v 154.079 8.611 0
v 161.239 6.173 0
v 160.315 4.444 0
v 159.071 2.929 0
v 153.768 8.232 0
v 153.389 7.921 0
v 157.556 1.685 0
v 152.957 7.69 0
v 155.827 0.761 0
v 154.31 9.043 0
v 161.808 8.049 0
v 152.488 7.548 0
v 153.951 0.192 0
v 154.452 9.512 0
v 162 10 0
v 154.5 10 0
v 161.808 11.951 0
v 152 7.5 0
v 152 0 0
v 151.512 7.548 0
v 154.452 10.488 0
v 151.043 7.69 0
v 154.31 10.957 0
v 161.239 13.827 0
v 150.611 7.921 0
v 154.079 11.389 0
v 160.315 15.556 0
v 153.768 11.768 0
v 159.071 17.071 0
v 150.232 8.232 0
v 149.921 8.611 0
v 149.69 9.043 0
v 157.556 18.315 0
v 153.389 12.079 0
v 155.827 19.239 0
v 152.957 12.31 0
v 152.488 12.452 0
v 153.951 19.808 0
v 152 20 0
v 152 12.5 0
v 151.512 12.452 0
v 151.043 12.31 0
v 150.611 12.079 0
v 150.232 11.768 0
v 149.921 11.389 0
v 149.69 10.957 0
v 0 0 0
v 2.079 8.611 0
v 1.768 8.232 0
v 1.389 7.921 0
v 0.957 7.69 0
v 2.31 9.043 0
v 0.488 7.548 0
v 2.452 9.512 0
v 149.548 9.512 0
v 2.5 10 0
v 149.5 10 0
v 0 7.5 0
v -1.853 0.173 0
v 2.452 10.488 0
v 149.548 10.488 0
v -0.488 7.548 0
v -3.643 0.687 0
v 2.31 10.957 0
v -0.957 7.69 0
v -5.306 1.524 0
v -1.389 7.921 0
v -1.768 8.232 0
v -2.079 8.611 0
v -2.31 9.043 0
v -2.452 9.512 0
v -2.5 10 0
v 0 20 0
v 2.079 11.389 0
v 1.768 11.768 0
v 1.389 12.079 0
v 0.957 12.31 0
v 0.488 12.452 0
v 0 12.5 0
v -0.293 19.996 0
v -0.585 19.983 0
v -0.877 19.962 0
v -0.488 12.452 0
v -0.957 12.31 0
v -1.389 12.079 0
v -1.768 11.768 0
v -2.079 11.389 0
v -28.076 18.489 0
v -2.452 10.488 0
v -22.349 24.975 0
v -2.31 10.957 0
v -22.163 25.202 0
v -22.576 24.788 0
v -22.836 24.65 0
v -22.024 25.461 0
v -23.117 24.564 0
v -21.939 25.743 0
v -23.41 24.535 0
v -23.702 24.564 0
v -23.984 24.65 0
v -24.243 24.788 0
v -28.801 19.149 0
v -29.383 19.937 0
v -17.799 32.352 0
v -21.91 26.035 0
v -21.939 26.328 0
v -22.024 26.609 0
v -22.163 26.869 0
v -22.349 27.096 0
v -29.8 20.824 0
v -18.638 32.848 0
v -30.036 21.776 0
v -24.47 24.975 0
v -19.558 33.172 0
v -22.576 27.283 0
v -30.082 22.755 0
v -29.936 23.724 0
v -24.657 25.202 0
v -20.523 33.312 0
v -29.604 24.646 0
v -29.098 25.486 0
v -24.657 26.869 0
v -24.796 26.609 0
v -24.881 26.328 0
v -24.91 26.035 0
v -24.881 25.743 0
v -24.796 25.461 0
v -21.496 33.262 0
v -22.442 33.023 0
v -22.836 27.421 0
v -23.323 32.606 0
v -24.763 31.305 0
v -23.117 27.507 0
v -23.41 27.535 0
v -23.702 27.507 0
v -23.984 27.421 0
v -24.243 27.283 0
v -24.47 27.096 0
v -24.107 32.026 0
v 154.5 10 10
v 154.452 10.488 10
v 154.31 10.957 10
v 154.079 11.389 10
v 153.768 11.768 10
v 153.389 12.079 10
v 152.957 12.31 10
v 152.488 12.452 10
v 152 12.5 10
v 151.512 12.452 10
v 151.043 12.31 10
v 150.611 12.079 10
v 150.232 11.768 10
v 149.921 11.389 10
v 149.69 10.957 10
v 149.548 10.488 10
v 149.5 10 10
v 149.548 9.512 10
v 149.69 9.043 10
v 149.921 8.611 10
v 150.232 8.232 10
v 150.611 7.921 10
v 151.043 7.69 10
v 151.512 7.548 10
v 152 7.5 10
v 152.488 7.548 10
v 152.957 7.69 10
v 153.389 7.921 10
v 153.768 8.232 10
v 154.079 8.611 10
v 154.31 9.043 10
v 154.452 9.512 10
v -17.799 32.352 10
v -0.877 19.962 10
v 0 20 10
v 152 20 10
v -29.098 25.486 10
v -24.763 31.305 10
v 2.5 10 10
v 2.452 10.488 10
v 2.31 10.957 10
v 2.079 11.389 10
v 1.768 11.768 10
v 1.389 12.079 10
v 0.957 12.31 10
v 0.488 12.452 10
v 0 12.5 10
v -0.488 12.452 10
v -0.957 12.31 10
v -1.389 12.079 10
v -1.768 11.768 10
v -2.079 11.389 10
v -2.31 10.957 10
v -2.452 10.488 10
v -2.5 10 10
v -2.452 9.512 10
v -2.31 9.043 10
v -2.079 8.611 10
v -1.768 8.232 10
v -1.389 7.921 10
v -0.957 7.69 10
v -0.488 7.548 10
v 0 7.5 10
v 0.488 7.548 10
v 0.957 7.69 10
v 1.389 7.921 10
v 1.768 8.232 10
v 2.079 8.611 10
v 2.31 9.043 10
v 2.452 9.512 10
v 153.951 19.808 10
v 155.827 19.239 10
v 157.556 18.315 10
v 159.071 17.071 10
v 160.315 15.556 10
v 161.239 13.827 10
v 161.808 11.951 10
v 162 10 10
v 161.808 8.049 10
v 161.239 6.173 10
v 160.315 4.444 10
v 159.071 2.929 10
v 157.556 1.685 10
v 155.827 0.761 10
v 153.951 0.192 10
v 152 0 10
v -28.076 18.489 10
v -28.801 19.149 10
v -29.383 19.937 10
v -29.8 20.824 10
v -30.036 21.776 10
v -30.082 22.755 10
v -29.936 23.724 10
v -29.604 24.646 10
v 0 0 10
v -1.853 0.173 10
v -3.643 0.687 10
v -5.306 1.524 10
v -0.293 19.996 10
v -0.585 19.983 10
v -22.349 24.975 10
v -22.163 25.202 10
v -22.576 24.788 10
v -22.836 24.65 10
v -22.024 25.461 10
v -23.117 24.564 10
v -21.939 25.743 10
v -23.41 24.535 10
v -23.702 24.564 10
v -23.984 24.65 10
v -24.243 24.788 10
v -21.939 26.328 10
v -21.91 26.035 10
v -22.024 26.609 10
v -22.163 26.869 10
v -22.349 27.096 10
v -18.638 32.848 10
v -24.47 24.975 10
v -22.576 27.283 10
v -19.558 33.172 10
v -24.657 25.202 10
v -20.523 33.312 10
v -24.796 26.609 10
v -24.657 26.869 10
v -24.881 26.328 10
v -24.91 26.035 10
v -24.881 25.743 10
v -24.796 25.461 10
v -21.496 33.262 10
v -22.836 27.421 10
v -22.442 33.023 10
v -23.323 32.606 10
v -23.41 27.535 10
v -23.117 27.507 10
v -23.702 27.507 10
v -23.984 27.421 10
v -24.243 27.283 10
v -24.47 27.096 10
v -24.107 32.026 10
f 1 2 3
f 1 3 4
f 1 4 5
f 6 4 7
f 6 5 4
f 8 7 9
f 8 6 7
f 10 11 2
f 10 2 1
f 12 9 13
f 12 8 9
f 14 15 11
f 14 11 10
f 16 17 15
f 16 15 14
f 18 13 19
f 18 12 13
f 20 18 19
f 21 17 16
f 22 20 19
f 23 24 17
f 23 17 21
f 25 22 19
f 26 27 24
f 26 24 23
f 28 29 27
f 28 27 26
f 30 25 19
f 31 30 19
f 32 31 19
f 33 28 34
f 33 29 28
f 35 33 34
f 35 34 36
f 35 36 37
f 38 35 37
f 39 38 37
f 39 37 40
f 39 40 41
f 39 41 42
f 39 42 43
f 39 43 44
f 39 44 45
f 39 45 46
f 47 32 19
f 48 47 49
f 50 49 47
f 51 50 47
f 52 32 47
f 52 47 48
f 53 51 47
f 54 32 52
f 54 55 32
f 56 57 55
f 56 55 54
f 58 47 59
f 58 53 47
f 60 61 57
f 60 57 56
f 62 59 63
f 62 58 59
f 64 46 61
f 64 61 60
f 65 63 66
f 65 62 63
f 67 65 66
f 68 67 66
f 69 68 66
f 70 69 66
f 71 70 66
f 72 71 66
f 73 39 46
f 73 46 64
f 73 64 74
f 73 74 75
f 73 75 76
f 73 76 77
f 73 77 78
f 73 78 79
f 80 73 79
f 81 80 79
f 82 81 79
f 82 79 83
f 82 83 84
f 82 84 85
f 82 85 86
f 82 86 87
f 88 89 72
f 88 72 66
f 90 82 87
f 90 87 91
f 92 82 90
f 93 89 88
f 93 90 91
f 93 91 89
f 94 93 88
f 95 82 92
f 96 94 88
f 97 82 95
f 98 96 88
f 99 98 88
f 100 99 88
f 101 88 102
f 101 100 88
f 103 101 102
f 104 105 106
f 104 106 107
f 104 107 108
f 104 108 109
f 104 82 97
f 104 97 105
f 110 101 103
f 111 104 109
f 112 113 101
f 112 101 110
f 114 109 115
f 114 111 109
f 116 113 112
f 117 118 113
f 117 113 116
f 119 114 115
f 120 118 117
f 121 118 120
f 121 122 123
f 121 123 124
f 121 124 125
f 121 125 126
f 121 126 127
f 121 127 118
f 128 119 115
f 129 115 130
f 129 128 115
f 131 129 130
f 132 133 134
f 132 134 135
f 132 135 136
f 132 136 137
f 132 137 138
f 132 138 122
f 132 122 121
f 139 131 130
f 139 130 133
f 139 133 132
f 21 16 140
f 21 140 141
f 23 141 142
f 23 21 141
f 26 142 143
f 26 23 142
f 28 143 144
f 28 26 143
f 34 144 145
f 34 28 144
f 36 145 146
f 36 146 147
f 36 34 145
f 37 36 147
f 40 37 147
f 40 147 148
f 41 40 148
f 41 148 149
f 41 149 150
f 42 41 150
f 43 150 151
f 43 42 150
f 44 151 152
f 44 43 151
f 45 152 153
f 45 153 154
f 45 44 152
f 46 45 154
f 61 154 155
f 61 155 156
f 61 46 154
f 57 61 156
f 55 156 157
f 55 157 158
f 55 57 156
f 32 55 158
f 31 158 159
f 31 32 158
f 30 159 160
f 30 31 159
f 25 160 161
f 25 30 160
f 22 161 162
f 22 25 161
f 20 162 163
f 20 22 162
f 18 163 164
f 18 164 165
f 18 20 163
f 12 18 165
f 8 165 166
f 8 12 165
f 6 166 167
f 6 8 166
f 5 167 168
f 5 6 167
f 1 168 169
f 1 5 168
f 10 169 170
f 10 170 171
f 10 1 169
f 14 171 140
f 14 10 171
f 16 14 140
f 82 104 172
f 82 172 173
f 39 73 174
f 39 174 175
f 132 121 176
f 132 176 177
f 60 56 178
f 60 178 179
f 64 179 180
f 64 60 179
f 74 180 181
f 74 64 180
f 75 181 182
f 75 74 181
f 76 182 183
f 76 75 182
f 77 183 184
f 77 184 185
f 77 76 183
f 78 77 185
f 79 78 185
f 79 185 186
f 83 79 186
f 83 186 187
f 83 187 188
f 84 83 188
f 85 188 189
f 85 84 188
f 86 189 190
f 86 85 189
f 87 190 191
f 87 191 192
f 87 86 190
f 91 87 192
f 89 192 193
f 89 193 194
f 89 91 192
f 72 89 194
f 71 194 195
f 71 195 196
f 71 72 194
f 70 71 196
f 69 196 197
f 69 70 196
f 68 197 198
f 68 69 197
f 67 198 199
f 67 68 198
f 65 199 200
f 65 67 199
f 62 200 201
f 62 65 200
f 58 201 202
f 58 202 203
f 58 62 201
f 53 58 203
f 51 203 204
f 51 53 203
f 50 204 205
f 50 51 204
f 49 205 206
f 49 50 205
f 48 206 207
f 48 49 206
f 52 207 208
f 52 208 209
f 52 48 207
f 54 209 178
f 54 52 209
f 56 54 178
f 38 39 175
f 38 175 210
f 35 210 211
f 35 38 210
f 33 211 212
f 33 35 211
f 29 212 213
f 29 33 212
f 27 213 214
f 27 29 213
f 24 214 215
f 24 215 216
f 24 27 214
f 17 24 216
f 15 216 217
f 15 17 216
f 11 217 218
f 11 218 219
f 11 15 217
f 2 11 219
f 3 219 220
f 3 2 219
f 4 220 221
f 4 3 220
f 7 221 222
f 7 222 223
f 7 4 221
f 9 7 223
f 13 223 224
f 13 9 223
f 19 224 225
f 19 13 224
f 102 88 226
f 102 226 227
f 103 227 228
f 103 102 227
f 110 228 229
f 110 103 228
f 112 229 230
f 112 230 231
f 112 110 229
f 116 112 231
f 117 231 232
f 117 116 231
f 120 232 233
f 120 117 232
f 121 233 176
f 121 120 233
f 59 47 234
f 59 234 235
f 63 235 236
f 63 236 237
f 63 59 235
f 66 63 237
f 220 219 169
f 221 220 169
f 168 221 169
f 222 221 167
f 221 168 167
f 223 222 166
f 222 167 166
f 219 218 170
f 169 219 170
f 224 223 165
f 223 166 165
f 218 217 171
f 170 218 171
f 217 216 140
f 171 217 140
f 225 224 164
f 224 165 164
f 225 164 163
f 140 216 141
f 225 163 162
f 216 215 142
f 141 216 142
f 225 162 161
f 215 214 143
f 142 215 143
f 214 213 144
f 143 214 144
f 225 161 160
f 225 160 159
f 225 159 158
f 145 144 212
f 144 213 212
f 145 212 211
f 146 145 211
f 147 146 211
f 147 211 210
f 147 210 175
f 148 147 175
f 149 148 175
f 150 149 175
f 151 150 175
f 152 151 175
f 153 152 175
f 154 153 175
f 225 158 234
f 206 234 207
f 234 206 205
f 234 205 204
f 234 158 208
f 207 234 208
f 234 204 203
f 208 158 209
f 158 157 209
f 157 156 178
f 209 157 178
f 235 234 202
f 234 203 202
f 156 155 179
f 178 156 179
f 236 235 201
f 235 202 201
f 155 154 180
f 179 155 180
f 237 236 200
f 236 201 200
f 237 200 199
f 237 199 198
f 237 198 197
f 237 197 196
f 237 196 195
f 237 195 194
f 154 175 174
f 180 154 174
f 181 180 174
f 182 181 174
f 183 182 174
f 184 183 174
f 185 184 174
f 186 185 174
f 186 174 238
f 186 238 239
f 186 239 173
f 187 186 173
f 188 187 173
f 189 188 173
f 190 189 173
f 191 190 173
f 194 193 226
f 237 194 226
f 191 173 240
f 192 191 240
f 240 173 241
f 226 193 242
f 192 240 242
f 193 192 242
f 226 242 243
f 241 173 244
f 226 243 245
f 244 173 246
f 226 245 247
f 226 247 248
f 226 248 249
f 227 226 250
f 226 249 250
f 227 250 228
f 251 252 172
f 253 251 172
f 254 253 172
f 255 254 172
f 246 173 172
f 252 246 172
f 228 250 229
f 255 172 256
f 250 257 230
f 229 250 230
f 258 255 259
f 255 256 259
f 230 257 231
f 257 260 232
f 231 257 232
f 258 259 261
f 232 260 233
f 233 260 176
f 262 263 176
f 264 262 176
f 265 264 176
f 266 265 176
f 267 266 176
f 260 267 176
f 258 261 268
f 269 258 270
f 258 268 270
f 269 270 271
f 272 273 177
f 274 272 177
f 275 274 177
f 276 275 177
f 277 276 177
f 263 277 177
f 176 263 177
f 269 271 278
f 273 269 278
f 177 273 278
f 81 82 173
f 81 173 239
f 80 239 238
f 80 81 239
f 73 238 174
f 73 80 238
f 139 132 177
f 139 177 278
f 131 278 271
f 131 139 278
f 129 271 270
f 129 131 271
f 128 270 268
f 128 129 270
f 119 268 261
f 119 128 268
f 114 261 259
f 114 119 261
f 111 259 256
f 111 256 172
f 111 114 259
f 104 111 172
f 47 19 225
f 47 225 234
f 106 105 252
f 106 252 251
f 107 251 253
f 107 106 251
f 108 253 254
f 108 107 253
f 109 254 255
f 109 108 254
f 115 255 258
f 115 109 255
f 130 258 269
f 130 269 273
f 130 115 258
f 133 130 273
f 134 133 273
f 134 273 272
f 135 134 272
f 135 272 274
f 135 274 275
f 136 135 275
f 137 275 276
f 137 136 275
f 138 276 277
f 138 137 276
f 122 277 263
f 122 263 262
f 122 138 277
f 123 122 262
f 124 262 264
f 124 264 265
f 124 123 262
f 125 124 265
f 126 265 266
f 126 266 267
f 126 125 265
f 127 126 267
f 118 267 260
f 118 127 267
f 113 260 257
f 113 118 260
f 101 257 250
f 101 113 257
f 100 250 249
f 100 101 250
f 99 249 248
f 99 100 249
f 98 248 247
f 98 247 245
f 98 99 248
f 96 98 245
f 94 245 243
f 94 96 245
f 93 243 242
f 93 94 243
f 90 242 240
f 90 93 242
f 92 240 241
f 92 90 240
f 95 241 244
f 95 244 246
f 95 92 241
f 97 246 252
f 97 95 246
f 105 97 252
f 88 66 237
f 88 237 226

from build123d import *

# Parameters (mm, degrees)
ESQUISSE1_R        = 2.5
ESQUISSE1_R_2      = 1.5
BOSS_EXTRU_1_DEPTH = 10


with BuildPart() as part:
    # Esquisse1 → Boss.-Extru.1 (new body)
    with BuildSketch(Plane.XY):
        with BuildLine():
            Line((-5.305683683, 1.523578547), (-28.075920727, 18.488824386))
            ThreePointArc((-28.075920727, 18.488824386), (-30.036088987, 21.775525063), (-29.098088919, 25.485621667))
            Line((-29.098088919, 25.485621667), (-24.762545303, 31.304656462))
            ThreePointArc((-24.762545303, 31.304656462), (-21.496491478, 33.261764377), (-17.799326826, 32.351625643))
            Line((-17.799326826, 32.351625643), (-0.876599726, 19.961504551))
            ThreePointArc((-0.876599726, 19.961504551), (-0.438722287, 19.990371502), (0, 20))
            Line((0, 20), (152, 20))
            ThreePointArc((152, 20), (162, 10), (152, 0))
            Line((152, 0), (0, 0))
            ThreePointArc((0, 0), (-2.760053031, 0.388438875), (-5.305683683, 1.523578547))
        make_face()
        with Locations((0, 10)):
            Circle(ESQUISSE1_R, mode=Mode.SUBTRACT)
        with Locations((152, 10)):
            Circle(ESQUISSE1_R, mode=Mode.SUBTRACT)
        with Locations((-23.409755192, 26.035431675)):
            Circle(ESQUISSE1_R_2, mode=Mode.SUBTRACT)
    extrude(amount=BOSS_EXTRU_1_DEPTH)


solid = part.part
